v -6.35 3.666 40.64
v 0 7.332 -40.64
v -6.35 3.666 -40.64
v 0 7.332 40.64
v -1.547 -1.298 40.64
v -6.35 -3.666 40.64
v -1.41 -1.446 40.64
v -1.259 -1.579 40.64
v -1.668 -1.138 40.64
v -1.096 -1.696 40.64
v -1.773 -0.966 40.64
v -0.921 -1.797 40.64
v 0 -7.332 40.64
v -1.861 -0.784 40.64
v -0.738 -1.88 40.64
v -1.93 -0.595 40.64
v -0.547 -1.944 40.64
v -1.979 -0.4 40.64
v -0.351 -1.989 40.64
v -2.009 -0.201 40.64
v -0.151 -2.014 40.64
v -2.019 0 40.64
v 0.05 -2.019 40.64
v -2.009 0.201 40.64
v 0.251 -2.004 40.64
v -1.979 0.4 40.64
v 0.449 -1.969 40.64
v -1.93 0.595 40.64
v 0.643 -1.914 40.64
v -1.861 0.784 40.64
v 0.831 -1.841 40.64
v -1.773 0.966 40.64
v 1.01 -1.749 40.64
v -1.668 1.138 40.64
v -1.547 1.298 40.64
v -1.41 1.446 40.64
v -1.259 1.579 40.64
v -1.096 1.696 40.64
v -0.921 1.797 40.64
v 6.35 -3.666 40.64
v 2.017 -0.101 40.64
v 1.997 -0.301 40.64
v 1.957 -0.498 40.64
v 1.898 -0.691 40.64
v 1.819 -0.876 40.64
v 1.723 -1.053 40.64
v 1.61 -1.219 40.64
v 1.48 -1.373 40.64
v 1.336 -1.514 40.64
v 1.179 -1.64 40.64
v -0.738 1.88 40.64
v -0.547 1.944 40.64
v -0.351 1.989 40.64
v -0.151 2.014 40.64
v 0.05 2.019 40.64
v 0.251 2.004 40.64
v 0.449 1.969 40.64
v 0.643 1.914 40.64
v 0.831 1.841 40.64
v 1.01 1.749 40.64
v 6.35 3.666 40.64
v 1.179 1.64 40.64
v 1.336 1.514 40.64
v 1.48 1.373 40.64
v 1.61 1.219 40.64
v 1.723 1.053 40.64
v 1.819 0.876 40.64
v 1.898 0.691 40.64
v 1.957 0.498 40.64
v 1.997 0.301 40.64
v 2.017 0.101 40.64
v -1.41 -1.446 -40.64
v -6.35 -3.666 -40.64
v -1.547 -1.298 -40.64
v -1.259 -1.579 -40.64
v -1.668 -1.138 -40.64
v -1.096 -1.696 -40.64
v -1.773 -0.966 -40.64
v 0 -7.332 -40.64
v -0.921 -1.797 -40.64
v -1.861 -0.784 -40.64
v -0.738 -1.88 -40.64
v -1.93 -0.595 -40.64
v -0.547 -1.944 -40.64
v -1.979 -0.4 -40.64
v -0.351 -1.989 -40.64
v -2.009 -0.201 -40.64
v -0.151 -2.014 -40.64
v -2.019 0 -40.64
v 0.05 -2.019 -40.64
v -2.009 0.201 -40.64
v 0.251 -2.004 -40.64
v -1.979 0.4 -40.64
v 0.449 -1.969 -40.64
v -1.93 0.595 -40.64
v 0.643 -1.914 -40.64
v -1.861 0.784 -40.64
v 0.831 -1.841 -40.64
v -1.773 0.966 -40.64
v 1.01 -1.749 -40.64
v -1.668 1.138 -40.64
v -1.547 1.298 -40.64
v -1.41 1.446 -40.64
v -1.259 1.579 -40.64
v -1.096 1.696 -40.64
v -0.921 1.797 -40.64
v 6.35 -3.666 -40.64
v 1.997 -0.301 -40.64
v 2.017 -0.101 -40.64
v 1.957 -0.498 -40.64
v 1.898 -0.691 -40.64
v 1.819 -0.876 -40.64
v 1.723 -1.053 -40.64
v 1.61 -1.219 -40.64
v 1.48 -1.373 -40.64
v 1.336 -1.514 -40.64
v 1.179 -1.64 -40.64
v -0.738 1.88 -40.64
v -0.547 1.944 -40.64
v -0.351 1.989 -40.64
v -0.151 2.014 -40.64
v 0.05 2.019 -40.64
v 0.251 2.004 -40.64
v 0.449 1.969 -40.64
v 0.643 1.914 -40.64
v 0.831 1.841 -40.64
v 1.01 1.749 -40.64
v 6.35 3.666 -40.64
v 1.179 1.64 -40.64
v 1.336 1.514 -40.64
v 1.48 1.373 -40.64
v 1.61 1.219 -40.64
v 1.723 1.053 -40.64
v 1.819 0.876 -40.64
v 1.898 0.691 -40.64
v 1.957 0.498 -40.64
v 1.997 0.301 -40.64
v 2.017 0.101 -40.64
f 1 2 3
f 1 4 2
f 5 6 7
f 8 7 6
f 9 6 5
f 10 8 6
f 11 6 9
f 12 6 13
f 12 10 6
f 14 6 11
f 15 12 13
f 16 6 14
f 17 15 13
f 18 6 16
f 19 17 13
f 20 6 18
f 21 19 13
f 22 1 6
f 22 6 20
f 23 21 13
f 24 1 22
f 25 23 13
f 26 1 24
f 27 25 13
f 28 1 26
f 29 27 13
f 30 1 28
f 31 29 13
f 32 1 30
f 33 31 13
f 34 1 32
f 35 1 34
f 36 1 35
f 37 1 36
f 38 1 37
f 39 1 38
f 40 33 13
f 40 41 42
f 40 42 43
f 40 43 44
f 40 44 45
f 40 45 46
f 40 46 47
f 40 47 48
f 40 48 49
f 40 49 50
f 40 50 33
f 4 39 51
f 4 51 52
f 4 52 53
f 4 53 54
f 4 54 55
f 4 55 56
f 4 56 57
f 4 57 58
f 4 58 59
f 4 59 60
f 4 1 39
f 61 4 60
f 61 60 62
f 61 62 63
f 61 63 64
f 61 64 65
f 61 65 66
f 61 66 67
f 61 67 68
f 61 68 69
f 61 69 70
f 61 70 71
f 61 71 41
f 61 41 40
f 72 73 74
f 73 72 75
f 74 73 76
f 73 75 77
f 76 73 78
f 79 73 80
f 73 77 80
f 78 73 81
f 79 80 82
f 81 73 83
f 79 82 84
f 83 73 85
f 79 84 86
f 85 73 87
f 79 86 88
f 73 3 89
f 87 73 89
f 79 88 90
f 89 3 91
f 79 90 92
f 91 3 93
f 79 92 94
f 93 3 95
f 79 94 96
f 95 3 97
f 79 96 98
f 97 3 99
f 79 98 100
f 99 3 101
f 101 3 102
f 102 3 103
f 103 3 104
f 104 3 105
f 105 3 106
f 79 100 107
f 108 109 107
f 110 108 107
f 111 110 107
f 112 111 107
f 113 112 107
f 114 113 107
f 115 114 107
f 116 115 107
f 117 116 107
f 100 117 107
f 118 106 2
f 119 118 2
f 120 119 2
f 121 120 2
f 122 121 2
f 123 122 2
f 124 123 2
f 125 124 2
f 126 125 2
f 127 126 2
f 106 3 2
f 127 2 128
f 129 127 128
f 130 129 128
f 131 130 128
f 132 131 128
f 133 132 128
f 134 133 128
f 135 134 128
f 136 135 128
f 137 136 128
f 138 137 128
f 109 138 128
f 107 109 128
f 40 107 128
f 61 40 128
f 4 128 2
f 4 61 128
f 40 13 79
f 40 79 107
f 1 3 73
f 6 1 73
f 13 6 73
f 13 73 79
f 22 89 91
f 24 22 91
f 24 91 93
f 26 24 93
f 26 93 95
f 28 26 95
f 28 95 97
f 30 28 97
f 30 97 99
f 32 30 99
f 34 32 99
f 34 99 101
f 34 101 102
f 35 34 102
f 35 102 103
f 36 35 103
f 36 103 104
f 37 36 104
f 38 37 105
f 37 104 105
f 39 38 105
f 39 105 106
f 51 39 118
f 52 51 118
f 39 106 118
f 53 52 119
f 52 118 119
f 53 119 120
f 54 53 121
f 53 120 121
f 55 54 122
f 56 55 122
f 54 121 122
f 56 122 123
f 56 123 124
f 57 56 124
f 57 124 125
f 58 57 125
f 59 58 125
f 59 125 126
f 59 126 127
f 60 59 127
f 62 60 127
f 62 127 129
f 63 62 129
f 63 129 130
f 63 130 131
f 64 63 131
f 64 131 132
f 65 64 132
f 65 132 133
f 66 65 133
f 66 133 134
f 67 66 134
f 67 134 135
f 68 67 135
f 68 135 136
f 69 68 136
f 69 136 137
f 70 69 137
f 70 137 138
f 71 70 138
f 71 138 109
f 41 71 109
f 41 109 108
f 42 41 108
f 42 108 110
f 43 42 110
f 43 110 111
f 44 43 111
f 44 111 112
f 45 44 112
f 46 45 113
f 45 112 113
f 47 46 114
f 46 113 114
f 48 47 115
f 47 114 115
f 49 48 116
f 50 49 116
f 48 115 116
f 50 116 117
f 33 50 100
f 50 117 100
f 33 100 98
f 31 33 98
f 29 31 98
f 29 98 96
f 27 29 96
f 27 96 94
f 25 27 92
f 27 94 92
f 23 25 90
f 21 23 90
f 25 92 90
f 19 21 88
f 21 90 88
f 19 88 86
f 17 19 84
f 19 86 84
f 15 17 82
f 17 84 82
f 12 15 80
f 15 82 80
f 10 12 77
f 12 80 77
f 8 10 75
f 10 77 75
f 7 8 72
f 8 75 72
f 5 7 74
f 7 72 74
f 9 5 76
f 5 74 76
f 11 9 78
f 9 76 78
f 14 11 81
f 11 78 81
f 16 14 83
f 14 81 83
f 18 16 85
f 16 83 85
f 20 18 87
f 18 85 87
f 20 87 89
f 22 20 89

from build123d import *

# Parameters (mm, degrees)
BOSS_EXTRUDE1_DEPTH = 40.64
SKETCH2_R           = 2.0193
CUT_EXTRUDE1_DEPTH  = 82.856729921


with BuildPart() as part:
    # Sketch1 → Boss-Extrude1 (new, symmetric)
    with BuildSketch(Plane.XY):
        Polygon((0, 7.332348419), (-6.35, 3.666174209), (-6.35, -3.666174209), (0, -7.332348419), (6.35, -3.666174209), (6.35, 3.666174209), align=None)
    extrude(amount=BOSS_EXTRUDE1_DEPTH, both=True)

    # Sketch2 → Cut-Extrude1 (cut, through all)
    with BuildSketch(Plane(origin=(0, 0, -40.64), x_dir=(-1, 0, 0), z_dir=(0, 0, -1))):
        Circle(SKETCH2_R)
    extrude(amount=-CUT_EXTRUDE1_DEPTH, mode=Mode.SUBTRACT)


solid = part.part
